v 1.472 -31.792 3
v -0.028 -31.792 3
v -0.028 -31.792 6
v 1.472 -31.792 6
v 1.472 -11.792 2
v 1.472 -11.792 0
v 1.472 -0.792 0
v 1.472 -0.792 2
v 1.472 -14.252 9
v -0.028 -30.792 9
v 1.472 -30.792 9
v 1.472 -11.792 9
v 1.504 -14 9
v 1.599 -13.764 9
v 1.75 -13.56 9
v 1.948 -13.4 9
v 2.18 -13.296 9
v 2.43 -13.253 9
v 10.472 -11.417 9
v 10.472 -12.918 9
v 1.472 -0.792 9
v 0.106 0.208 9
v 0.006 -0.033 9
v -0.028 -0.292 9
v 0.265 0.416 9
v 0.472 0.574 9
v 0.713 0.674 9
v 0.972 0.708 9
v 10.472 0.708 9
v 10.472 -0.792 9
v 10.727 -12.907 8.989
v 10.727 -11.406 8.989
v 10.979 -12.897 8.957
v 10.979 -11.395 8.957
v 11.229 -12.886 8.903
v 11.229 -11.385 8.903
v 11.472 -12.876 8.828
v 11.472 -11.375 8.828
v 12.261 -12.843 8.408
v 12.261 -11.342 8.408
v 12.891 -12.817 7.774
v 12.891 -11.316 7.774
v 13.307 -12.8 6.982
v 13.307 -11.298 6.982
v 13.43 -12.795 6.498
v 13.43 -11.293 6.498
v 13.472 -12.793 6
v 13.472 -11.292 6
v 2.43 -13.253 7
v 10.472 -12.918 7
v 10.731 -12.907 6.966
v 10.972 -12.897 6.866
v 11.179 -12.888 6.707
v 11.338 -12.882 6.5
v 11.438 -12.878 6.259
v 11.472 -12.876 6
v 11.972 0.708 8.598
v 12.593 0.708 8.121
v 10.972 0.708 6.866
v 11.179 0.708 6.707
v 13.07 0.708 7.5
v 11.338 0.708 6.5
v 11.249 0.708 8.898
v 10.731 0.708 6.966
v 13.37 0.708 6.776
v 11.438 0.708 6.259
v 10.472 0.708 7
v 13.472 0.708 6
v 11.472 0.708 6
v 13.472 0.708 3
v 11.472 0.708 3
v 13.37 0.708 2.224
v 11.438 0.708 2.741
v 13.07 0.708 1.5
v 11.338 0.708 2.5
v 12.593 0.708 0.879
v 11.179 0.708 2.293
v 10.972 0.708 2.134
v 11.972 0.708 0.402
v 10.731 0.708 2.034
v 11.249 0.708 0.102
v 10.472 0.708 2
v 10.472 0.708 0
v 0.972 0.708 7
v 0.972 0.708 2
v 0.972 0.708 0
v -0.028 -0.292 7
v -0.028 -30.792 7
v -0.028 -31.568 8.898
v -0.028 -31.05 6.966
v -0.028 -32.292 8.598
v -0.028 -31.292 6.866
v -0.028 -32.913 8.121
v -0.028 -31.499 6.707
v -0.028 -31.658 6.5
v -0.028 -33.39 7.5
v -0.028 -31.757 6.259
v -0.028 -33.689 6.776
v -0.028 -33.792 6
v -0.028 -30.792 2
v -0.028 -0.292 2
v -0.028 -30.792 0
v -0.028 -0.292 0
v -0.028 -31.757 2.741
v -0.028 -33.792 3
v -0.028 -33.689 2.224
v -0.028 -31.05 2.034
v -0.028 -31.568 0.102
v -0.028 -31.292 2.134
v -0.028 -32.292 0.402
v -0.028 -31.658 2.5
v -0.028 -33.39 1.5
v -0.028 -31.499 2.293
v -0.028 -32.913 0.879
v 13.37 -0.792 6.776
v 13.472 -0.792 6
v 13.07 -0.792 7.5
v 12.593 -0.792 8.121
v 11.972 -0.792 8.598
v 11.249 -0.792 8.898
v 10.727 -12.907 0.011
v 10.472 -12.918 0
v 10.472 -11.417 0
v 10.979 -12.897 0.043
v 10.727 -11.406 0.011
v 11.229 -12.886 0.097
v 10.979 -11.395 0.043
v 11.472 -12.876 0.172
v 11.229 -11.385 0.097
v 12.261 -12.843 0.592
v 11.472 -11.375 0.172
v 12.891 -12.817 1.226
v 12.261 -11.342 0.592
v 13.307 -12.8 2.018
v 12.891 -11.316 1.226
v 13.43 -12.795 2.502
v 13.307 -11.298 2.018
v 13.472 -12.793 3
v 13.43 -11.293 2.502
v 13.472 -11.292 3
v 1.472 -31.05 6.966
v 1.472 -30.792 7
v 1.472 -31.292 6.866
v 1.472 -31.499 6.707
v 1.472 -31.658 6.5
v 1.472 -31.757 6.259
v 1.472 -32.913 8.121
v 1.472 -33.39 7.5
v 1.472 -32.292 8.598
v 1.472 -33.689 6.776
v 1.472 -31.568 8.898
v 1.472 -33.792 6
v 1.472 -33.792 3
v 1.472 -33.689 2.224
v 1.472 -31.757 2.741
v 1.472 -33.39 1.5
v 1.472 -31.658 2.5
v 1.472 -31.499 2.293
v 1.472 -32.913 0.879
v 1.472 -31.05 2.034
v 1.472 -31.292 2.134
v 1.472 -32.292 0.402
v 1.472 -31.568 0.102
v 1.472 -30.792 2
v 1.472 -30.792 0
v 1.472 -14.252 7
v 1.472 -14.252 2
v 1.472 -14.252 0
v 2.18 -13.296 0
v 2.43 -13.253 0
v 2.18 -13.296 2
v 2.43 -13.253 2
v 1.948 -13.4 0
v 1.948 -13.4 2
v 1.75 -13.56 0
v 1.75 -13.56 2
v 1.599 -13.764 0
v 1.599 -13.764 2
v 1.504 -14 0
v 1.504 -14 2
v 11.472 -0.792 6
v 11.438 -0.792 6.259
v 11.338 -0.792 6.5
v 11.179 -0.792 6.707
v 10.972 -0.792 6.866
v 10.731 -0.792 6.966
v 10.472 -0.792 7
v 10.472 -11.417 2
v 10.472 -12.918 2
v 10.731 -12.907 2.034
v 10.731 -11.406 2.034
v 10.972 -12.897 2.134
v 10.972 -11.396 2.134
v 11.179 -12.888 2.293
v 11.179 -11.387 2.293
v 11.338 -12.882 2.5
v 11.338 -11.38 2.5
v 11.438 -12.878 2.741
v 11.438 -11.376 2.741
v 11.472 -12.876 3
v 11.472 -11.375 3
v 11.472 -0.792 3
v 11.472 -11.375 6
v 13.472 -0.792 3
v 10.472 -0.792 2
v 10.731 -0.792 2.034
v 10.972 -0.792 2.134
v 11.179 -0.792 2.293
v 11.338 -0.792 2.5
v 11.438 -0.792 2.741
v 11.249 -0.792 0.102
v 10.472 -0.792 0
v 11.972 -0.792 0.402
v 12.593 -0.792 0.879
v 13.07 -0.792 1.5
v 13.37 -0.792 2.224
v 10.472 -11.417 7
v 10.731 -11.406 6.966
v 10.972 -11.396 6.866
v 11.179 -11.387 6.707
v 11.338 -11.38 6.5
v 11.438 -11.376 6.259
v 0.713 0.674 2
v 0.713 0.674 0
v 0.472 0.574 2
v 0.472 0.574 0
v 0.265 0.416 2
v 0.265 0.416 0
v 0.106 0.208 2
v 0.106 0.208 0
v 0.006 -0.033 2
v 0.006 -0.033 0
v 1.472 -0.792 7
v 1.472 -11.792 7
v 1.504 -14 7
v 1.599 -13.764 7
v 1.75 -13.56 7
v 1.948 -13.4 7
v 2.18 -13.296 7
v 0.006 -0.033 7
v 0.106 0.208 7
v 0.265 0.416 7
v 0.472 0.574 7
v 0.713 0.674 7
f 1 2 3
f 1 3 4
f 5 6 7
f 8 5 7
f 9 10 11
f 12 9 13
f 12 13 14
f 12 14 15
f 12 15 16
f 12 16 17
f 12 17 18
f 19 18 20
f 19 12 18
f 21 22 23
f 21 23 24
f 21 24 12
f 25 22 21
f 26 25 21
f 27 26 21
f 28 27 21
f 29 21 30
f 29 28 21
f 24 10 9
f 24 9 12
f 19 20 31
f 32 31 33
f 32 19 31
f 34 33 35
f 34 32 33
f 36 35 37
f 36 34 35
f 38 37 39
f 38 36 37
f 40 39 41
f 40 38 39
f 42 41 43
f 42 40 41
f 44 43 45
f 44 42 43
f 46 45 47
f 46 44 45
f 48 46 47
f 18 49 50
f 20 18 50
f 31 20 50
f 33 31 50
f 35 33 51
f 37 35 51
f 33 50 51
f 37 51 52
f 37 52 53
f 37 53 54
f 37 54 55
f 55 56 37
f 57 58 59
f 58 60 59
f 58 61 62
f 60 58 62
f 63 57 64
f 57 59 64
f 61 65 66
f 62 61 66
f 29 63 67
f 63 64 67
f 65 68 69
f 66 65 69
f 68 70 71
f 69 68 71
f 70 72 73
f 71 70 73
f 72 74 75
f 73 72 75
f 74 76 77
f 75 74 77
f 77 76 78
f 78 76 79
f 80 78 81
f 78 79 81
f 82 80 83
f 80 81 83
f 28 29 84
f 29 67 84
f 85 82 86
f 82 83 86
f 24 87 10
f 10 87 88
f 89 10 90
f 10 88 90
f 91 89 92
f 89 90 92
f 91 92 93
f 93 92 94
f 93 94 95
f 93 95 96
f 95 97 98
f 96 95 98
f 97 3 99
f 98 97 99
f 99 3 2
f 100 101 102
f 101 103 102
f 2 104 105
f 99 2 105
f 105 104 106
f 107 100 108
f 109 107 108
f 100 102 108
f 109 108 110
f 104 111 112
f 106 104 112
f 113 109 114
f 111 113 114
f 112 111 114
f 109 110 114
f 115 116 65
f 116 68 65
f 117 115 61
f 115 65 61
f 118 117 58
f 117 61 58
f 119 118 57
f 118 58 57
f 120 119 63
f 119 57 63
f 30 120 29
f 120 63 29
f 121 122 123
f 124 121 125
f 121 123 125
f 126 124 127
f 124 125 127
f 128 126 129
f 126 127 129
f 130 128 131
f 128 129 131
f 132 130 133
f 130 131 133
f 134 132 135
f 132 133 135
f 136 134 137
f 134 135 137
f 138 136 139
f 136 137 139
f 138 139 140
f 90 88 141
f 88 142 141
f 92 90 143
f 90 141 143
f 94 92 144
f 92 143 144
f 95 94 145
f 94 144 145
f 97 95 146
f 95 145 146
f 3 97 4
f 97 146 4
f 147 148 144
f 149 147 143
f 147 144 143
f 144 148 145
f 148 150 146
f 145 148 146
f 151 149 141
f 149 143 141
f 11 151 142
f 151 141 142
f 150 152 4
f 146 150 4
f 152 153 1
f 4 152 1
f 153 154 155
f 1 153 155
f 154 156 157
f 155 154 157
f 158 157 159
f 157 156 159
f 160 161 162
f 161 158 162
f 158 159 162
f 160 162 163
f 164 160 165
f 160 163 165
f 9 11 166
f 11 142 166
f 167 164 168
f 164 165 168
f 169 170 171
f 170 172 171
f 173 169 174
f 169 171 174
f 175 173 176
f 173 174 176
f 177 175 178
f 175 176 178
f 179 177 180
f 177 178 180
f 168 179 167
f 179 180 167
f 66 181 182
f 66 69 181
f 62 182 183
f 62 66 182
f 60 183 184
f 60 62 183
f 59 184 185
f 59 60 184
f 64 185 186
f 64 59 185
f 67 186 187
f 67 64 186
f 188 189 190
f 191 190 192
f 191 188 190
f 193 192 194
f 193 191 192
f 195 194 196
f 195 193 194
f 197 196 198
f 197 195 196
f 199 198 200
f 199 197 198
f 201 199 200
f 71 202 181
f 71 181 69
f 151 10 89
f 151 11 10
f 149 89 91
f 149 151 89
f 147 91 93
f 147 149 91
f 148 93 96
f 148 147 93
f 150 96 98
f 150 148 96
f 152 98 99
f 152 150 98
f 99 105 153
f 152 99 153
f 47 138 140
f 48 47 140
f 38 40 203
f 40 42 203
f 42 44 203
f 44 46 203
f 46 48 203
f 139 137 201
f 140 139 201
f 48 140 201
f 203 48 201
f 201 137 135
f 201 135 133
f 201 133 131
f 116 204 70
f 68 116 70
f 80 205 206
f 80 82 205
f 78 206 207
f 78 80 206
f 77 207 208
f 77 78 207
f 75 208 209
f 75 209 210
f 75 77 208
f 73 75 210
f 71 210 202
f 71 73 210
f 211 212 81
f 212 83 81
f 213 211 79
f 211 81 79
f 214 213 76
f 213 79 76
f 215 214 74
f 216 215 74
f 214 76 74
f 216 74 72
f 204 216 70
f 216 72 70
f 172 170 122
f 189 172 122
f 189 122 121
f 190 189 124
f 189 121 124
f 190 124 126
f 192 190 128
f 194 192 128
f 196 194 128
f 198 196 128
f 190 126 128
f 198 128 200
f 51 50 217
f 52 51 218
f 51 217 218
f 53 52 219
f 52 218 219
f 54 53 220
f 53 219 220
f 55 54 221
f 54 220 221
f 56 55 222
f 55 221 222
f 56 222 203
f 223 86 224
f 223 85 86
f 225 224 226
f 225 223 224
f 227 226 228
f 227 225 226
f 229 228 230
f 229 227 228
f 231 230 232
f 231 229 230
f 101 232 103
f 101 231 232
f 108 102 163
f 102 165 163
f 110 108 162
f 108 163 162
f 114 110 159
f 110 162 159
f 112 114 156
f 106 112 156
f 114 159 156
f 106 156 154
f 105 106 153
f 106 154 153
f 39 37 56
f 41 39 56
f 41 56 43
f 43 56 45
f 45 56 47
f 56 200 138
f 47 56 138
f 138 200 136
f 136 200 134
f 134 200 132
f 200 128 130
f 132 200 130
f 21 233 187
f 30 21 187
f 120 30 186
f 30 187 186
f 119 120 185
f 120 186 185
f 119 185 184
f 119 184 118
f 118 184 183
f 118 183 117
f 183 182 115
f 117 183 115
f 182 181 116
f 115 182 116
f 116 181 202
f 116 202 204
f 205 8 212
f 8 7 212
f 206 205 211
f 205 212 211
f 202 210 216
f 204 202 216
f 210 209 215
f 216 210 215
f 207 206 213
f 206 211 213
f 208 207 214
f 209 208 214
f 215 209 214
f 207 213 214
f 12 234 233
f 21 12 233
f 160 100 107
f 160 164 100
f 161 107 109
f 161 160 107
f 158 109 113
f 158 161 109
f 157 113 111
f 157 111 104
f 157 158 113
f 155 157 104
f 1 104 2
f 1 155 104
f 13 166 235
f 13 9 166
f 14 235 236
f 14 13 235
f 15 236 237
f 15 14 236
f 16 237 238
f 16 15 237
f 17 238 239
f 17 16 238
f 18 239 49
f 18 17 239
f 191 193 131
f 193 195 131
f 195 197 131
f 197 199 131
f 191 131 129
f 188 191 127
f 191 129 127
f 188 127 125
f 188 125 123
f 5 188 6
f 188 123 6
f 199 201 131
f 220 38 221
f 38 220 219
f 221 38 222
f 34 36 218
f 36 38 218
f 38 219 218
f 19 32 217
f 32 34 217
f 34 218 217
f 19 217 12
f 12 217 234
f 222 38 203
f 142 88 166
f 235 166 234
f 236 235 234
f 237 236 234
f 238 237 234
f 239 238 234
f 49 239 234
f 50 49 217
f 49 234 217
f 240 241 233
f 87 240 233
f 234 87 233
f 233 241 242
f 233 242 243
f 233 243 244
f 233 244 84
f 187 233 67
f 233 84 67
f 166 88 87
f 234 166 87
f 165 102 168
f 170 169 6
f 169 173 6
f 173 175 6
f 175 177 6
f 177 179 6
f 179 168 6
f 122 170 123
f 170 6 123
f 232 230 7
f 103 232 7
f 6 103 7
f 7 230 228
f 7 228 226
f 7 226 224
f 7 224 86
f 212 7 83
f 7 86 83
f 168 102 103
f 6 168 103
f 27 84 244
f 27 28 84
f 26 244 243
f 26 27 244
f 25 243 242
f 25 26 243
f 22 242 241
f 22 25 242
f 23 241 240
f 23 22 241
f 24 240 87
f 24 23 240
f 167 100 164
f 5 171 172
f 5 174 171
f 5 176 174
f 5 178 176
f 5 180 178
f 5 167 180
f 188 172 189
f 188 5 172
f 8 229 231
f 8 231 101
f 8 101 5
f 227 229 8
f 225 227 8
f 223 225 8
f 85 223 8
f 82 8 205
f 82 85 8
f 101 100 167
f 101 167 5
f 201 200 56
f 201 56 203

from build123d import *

# Parameters (mm, degrees)
F1_DEPTH      = 2.5
F1_DEPTH_BACK = 2.5
F2_SIZE2      = 1
F2_SIZE       = 2
F3_R          = 3
F4_START      = 4
F4_DEPTH      = 5
F5_R          = 5
F5_2_R        = 5
F6_R          = 2
F6_2_R        = 2
F7_W          = 2.5
F7_H          = 2.5
F8_ANGLE      = 90
F9_DEPTH      = 10
F11_DEPTH     = 8
F12_DEPTH     = 8
F15_START     = 2.5
F14_R         = 2.5
F15_DEPTH     = 1.5
F16_W         = 12
F16_H         = 2
F16_W_2       = 2
F16_H_2       = 20
F17_DEPTH     = 7
F18_T         = -1
F16_H_3       = 1.5
F16_W_3       = 1.5
F19_DEPTH     = 9
F20_START     = 2
F20_DEPTH     = 5
F21_R         = 3
F21_2_R       = 3
F22_T1_DEPTH  = 2
F22_T3_DEPTH  = 1
F22_T5_DEPTH  = 1
F22_T7_DEPTH  = 2
F22_T9_DEPTH  = 2
F22_T11_DEPTH = 11
F22_T13_DEPTH = 32
F22_S17_W     = 1.02
F22_S17_H     = 1.02
F22_T18_DEPTH = 1.02
F22_S23_W     = 1.02
F22_S23_H     = 1.02
F22_T24_DEPTH = 1.02
F22_T28_ANGLE = 233.2969892374
F22_T30_ANGLE = 233.2969892374
F22_T32_ANGLE = 233.2969892374
F22_T34_ANGLE = 233.2969892374
F22_T35_DEPTH = 9
F22_T37_DEPTH = 9
F22_T39_DEPTH = 17
F22_T42_ANGLE = 233.2969892374
F22_T44_ANGLE = 90
F22_T46_ANGLE = 233.2969892374
F22_T48_ANGLE = 90
F22_T50_ANGLE = 90
F22_T52_ANGLE = 233.2969892374
F22_T54_ANGLE = 233.2969892374
F22_T56_ANGLE = 90
F22_T58_ANGLE = 233.2969892374
F22_T60_ANGLE = 233.2969892374
F22_T62_ANGLE = 90
F22_T64_ANGLE = 233.2969892374
F22_T66_ANGLE = 90
F22_T68_ANGLE = 233.2969892374
F22_2_F1_R    = 1
F22_2_F2_R    = 1


# Not quite as in the source:
# - a fillet or chamfer that OpenCascade refuses, or shapes differently, is made with other operations: its cross-section is extruded or revolved along the edge and cut away or added
# - a feature names something its author has since deleted; it is built from what else it names


with BuildPart() as f1:
    # F0 (on Top) → F1 (new body, two sides)
    with BuildSketch(Plane.XY) as f1_sk:
        Polygon((-2.4175545031, 19.9997189244), (-63.6058346017, 10), (-71.3429901912, 55.5274909482), (-73.2526121256, 67.2124675644), (-87.2356820635, 67.2124675644), (-132.104240014, 0), (-120.0807613656, 0), (-81.7352983314, 57.4409632971), (-81.1490054203, 53.9442313206), (-72.104240014, 0), (-63.6058346017, 0), (-0.7575159774, 9.8419431859), (0.8509074882, 0), (10.9835668635, 0), (4.4465969461, 39.9997189244), (-5.6860624292, 39.9997189244), align=None)
    extrude(amount=F1_DEPTH)
    extrude(f1_sk.sketch, amount=-F1_DEPTH_BACK)

    # F2
    f2_edges = [f1.edges().sort_by_distance(p)[0] for p in [
        (-80.244147, 67.212468, 2.5),
    ]]
    f2_side = f1.faces().sort_by_distance((-80.244147, 67.212468, 0))[0]
    chamfer(f2_edges, length=F2_SIZE, length2=F2_SIZE2, reference=f2_side)

    # F3
    f3_edges = [f1.edges().sort_by_distance(p)[0] for p in [
        (-80.496216, 66.212468, 2.5),
    ]]
    fillet(f3_edges, radius=F3_R)

    # F5
    f5_edges = [f1.edges().sort_by_distance(p)[0] for p in [
        (-81.735298, 57.440963, 0),
        (-72.10424, 0, 0),
        (-120.080761, 0, 0),
        (0.850907, 0, 0),
        (-87.235682, 67.212468, -1),
        (-73.252612, 67.212468, -1),
        (4.446597, 39.999719, 0),
    ]]
    fillet(f5_edges, radius=F5_R)

    # F6
    f6_edges = [f1.edges().sort_by_distance(p)[0] for p in [
        (-2.417555, 19.999719, 0),
        (-63.605835, 10, 0),
        (-0.757516, 9.841943, 0),
        (-5.686062, 39.999719, 0),
        (10.983567, 0, 0),
        (-132.10424, 0, 0),
    ]]
    fillet(f6_edges, radius=F6_R)

    # F7 (on Top) → F8 (revolve, cut)
    with BuildSketch(Plane.XY):
        Polygon((-82.9107738397, 68.988720722), (-82.9107738397, 65.988720722), (-82.0857738397, 65.988720722), (-79.9107738397, 65.988720722), (-77.7357738397, 65.988720722), (-76.9107738397, 65.988720722), (-76.9107738397, 68.988720722), align=None)
        Polygon((-82.4107738397, 65.488720722), (-79.9107738397, 65.488720722), (-77.4107738397, 65.488720722), (-76.9107738397, 65.1856904189), (-76.9107738397, 65.488720722), (-77.7357738397, 65.988720722), (-79.9107738397, 65.988720722), (-82.0857738397, 65.988720722), (-82.9107738397, 65.488720722), (-82.9107738397, 65.1856904189), align=None)
        Polygon((-82.9107738397, 65.988720722), (-82.9107738397, 65.488720722), (-82.0857738397, 65.988720722), align=None)
        Polygon((-77.7357738397, 65.988720722), (-76.9107738397, 65.488720722), (-76.9107738397, 65.988720722), align=None)
        Polygon((-82.9107738397, 65.1856904189), (-82.9107738397, 62.988720722), (-82.4107738397, 62.988720722), (-82.4107738397, 65.488720722), align=None)
        with Locations((-81.1607738397, 64.238720722)):
            Rectangle(F7_W, F7_H)
        with Locations((-78.6607738397, 64.238720722)):
            Rectangle(F7_W, F7_H)
        Polygon((-77.4107738397, 62.988720722), (-76.9107738397, 62.988720722), (-76.9107738397, 65.1856904189), (-77.4107738397, 65.488720722), align=None)
    revolve(axis=Axis((-79.9107738397, 62.988720722, 0), (-1, 0, 0)), revolution_arc=F8_ANGLE, mode=Mode.SUBTRACT)


with BuildPart() as f4:
    # F0 (on Top) → F4 (new body)
    with BuildSketch(Plane.XY.offset(F4_START)):
        Polygon((-2.4175545031, 19.9997189244), (-63.6058346017, 10), (-71.3429901912, 55.5274909482), (-73.2526121256, 67.2124675644), (-87.2356820635, 67.2124675644), (-132.104240014, 0), (-120.0807613656, 0), (-81.7352983314, 57.4409632971), (-81.1490054203, 53.9442313206), (-72.104240014, 0), (-63.6058346017, 0), (-0.7575159774, 9.8419431859), (0.8509074882, 0), (10.9835668635, 0), (4.4465969461, 39.9997189244), (-5.6860624292, 39.9997189244), align=None)
    extrude(amount=F4_DEPTH)

    # F5#2
    f5_2_edges = [f4.edges().sort_by_distance(p)[0] for p in [
        (-81.735298, 57.440963, 6.5),
        (-72.10424, 0, 6.5),
        (-120.080761, 0, 6.5),
        (0.850907, 0, 6.5),
        (-87.235682, 67.212468, 6.5),
        (-73.252612, 67.212468, 6.5),
        (4.446597, 39.999719, 6.5),
    ]]
    fillet(f5_2_edges, radius=F5_2_R)

    # F6#2
    f6_2_edges = [f4.edges().sort_by_distance(p)[0] for p in [
        (-2.417555, 19.999719, 6.5),
        (-63.605835, 10, 6.5),
        (-0.757516, 9.841943, 6.5),
        (-5.686062, 39.999719, 6.5),
        (10.983567, 0, 6.5),
        (-132.10424, 0, 6.5),
    ]]
    fillet(f6_2_edges, radius=F6_2_R)


with BuildPart() as f9_tool:
    # F7 (on Top) → F9 (new body)
    with BuildSketch(Plane.XY):
        Polygon((-82.9107738397, 68.988720722), (-82.9107738397, 65.988720722), (-82.0857738397, 65.988720722), (-79.9107738397, 65.988720722), (-77.7357738397, 65.988720722), (-76.9107738397, 65.988720722), (-76.9107738397, 68.988720722), align=None)
        Polygon((-82.9107738397, 65.988720722), (-82.9107738397, 65.488720722), (-82.0857738397, 65.988720722), align=None)
        Polygon((-77.7357738397, 65.988720722), (-76.9107738397, 65.488720722), (-76.9107738397, 65.988720722), align=None)
        Polygon((-82.4107738397, 65.488720722), (-79.9107738397, 65.488720722), (-77.4107738397, 65.488720722), (-76.9107738397, 65.1856904189), (-76.9107738397, 65.488720722), (-77.7357738397, 65.988720722), (-79.9107738397, 65.988720722), (-82.0857738397, 65.988720722), (-82.9107738397, 65.488720722), (-82.9107738397, 65.1856904189), align=None)
        Polygon((-82.9107738397, 65.1856904189), (-82.9107738397, 62.988720722), (-82.4107738397, 62.988720722), (-82.4107738397, 65.488720722), align=None)
        with Locations((-81.1607738397, 64.238720722)):
            Rectangle(F7_W, F7_H)
        with Locations((-78.6607738397, 64.238720722)):
            Rectangle(F7_W, F7_H)
        Polygon((-77.4107738397, 62.988720722), (-76.9107738397, 62.988720722), (-76.9107738397, 65.1856904189), (-77.4107738397, 65.488720722), align=None)
        Polygon((-82.9107738397, 59.988720722), (-79.9107738397, 59.988720722), (-79.9107738397, 60.488720722), (-82.4107738397, 60.488720722), (-82.4107738397, 62.988720722), (-82.9107738397, 62.988720722), align=None)
        with Locations((-81.1607738397, 61.738720722)):
            Rectangle(F7_W, F7_H)
        with Locations((-78.6607738397, 61.738720722)):
            Rectangle(F7_W, F7_H)
        Polygon((-79.9107738397, 60.488720722), (-79.9107738397, 59.988720722), (-76.9107738397, 59.988720722), (-76.9107738397, 62.988720722), (-77.4107738397, 62.988720722), (-77.4107738397, 60.488720722), align=None)
    extrude(amount=F9_DEPTH)


with BuildPart() as f1_1:
    add(f1.part)

    # F9: cut by f9_tool
    add(f9_tool.part, mode=Mode.SUBTRACT)

    # F7 (on Top) → F10 (revolve, cut)
    with BuildSketch(Plane.XY):
        Polygon((-85.7107738397, 63.488720722), (-82.9107738397, 65.1856904189), (-82.9107738397, 65.488720722), (-86.2107738397, 63.488720722), (-86.2107738397, 62.988720722), (-85.7107738397, 62.988720722), align=None)
        Polygon((-85.7107738397, 62.988720722), (-82.9107738397, 62.988720722), (-82.9107738397, 65.1856904189), (-85.7107738397, 63.488720722), align=None)
        Polygon((-82.4107738397, 65.488720722), (-79.9107738397, 65.488720722), (-77.4107738397, 65.488720722), (-76.9107738397, 65.1856904189), (-76.9107738397, 65.488720722), (-77.7357738397, 65.988720722), (-79.9107738397, 65.988720722), (-82.0857738397, 65.988720722), (-82.9107738397, 65.488720722), (-82.9107738397, 65.1856904189), align=None)
        Polygon((-82.9107738397, 65.1856904189), (-82.9107738397, 62.988720722), (-82.4107738397, 62.988720722), (-82.4107738397, 65.488720722), align=None)
        with Locations((-81.1607738397, 64.238720722)):
            Rectangle(F7_W, F7_H)
        with Locations((-78.6607738397, 64.238720722)):
            Rectangle(F7_W, F7_H)
        Polygon((-77.4107738397, 62.988720722), (-76.9107738397, 62.988720722), (-76.9107738397, 65.1856904189), (-77.4107738397, 65.488720722), align=None)
        Polygon((-76.9107738397, 65.1856904189), (-76.9107738397, 62.988720722), (-74.1107738397, 62.988720722), (-74.1107738397, 63.488720722), align=None)
        Polygon((-76.9107738397, 65.488720722), (-76.9107738397, 65.1856904189), (-74.1107738397, 63.488720722), (-74.1107738397, 62.988720722), (-73.6107738397, 62.988720722), (-73.6107738397, 63.488720722), align=None)
    revolve(axis=Axis((-75.7607738397, 62.988720722, 0), (1, 0, 0)), mode=Mode.SUBTRACT)

    # F7 (on Top) → F11 (cut)
    with BuildSketch(Plane.XY):
        with Locations((-78.6607738397, 64.238720722)):
            Rectangle(F7_W, F7_H)
        with Locations((-81.1607738397, 64.238720722)):
            Rectangle(F7_W, F7_H)
        with Locations((-78.6607738397, 61.738720722)):
            Rectangle(F7_W, F7_H)
        with Locations((-81.1607738397, 61.738720722)):
            Rectangle(F7_W, F7_H)
    extrude(amount=F11_DEPTH, mode=Mode.SUBTRACT)



with BuildPart() as f4_1:
    add(f4.part)

    # F9: cut by f9_tool
    add(f9_tool.part, mode=Mode.SUBTRACT)


with BuildPart() as f12:
    # F7 (on Top) → F12 (new body)
    with BuildSketch(Plane.XY):
        with Locations((-81.1607738397, 64.238720722)):
            Rectangle(F7_W, F7_H)
        with Locations((-78.6607738397, 64.238720722)):
            Rectangle(F7_W, F7_H)
        with Locations((-81.1607738397, 61.738720722)):
            Rectangle(F7_W, F7_H)
        with Locations((-78.6607738397, 61.738720722)):
            Rectangle(F7_W, F7_H)
    extrude(amount=F12_DEPTH)

    # F7 (on Top) → F13 (revolve)
    with BuildSketch(Plane.XY):
        Polygon((-85.7107738397, 62.988720722), (-82.9107738397, 62.988720722), (-82.9107738397, 65.1856904189), (-85.7107738397, 63.488720722), align=None)
        Polygon((-82.9107738397, 65.1856904189), (-82.9107738397, 62.988720722), (-82.4107738397, 62.988720722), (-82.4107738397, 65.488720722), align=None)
        with Locations((-81.1607738397, 64.238720722)):
            Rectangle(F7_W, F7_H)
        with Locations((-78.6607738397, 64.238720722)):
            Rectangle(F7_W, F7_H)
        Polygon((-77.4107738397, 62.988720722), (-76.9107738397, 62.988720722), (-76.9107738397, 65.1856904189), (-77.4107738397, 65.488720722), align=None)
        Polygon((-76.9107738397, 65.1856904189), (-76.9107738397, 62.988720722), (-74.1107738397, 62.988720722), (-74.1107738397, 63.488720722), align=None)
    revolve(axis=Axis((-79.9107738397, 62.988720722, 0), (1, 0, 0)))


with BuildPart() as f1_2:
    add(f1_1.part)

    add(f4_1.part)  # F15 merges F4
    # F14 (on Top) → F15 (join)
    with BuildSketch(Plane.XY.offset(F15_START)):
        with Locations((5.1001101943, 5)):
            Circle(F14_R)
        with Locations((0.6434008568, 34.9997189244)):
            Circle(F14_R)
        with Locations((-122.7546855807, 5)):
            Circle(F14_R)
        with Locations((-67.8727891486, 5)):
            Circle(F14_R)
        with Locations((-81.4505400433, 54.6900098794)):
            Circle(F14_R)
    extrude(amount=F15_DEPTH)


with BuildPart() as f17:
    # F16 (on Top) → F17 (new body)
    with BuildSketch(Plane.XY):
        Polygon((-30.1369051993, -11.2915403917), (-30.1369051993, -0.2915403917), (-18.1369051993, -0.2915403917), (-18.1369051993, 1.7084596083), (-32.1369051993, 1.7084596083), (-32.1369051993, -13.2915403917), (-30.1369051993, -13.2915403917), align=None)
        with Locations((-24.1369051993, -12.2915403917)):
            Rectangle(F16_W, F16_H)
        with Locations((-31.1369051993, -23.2915403917)):
            Rectangle(F16_W_2, F16_H_2)
    extrude(amount=F17_DEPTH)

    # F18
    f18_openings = [f17.faces().sort_by_distance(p)[0] for p in [
        (-30.136905, -23.29154, 3.5),
        (-30.136905, -5.79154, 3.5),
        (-24.136905, -13.29154, 3.5),
        (-24.136905, -0.29154, 3.5),
        (-24.136905, -11.29154, 3.5),
        (-25.136905, 1.70846, 3.5),
        (-32.136905, -15.79154, 3.5),
    ]]
    offset(amount=F18_T, openings=f18_openings)

    # F21
    f21_edges = [f17.edges().sort_by_distance(p)[0] for p in [
        (-31.136905, -33.29154, 7),
        (-31.136905, -33.29154, 0),
        (-18.136905, -12.29154, 0),
        (-18.136905, -12.29154, 7),
        (-18.136905, 0.70846, 7),
        (-18.136905, 0.70846, 0),
    ]]
    fillet(f21_edges, radius=F21_R)

    # F22: fillet of radius 1 on 28 edges, made by hand

    # F22_s2 → F22_t1 (join)
    with BuildSketch(Plane.YZ.offset(-32.1369051993)):
        with BuildLine():
            ThreePointArc((-31.2915403917, 1), (-31.9986471729, 1.2928932188), (-32.2915403917, 2))
            Line((-32.2915403917, 2), (-32.3115403917, 2))
            Line((-32.3115403917, 2), (-32.3115403917, 0.98))
            Line((-32.3115403917, 0.98), (-31.2915403917, 0.98))
            Line((-31.2915403917, 0.98), (-31.2915403917, 1))
        make_face()
        with BuildLine():
            ThreePointArc((-31.2915403917, 6), (-31.9986471729, 5.7071067812), (-32.2915403917, 5))
            Line((-32.2915403917, 5), (-32.3115403917, 5))
            Line((-32.3115403917, 5), (-32.3115403917, 6.02))
            Line((-32.3115403917, 6.02), (-31.2915403917, 6.02))
            Line((-31.2915403917, 6.02), (-31.2915403917, 6))
        make_face()
    extrude(amount=F22_T1_DEPTH)

    # F22_s4 → F22_t3 (join)
    with BuildSketch(Plane.XY):
        with BuildLine():
            ThreePointArc((-29.1369051993, -0.2915403917), (-29.8440119805, -0.5844336106), (-30.1369051993, -1.2915403917))
            Line((-30.1369051993, -1.2915403917), (-30.1569051993, -1.2915403917))
            Line((-30.1569051993, -1.2915403917), (-30.1569051993, -0.2715403917))
            Line((-30.1569051993, -0.2715403917), (-29.1369051993, -0.2715403917))
            Line((-29.1369051993, -0.2715403917), (-29.1369051993, -0.2915403917))
        make_face()
        with BuildLine():
            ThreePointArc((-29.1369051993, -13.2915403917), (-29.8440119805, -13.5844336106), (-30.1369051993, -14.2915403917))
            Line((-30.1369051993, -14.2915403917), (-30.1569051993, -14.2915403917))
            Line((-30.1569051993, -14.2915403917), (-30.1569051993, -13.2715403917))
            Line((-30.1569051993, -13.2715403917), (-29.1369051993, -13.2715403917))
            Line((-29.1369051993, -13.2715403917), (-29.1369051993, -13.2915403917))
        make_face()
        with BuildLine():
            ThreePointArc((-30.1369051993, -10.2915403917), (-29.8440119805, -10.9986471729), (-29.1369051993, -11.2915403917))
            Line((-29.1369051993, -11.2915403917), (-29.1369051993, -11.3115403917))
            Line((-29.1369051993, -11.3115403917), (-30.1569051993, -11.3115403917))
            Line((-30.1569051993, -11.3115403917), (-30.1569051993, -10.2915403917))
            Line((-30.1569051993, -10.2915403917), (-30.1369051993, -10.2915403917))
        make_face()
    extrude(amount=F22_T3_DEPTH)

    # F22_s6 → F22_t5 (join)
    with BuildSketch(Plane.XY.offset(6)):
        with BuildLine():
            ThreePointArc((-29.1369051993, -0.2915403917), (-29.8440119805, -0.5844336106), (-30.1369051993, -1.2915403917))
            Line((-30.1369051993, -1.2915403917), (-30.1569051993, -1.2915403917))
            Line((-30.1569051993, -1.2915403917), (-30.1569051993, -0.2715403917))
            Line((-30.1569051993, -0.2715403917), (-29.1369051993, -0.2715403917))
            Line((-29.1369051993, -0.2715403917), (-29.1369051993, -0.2915403917))
        make_face()
        with BuildLine():
            ThreePointArc((-29.1369051993, -13.2915403917), (-29.8440119805, -13.5844336106), (-30.1369051993, -14.2915403917))
            Line((-30.1369051993, -14.2915403917), (-30.1569051993, -14.2915403917))
            Line((-30.1569051993, -14.2915403917), (-30.1569051993, -13.2715403917))
            Line((-30.1569051993, -13.2715403917), (-29.1369051993, -13.2715403917))
            Line((-29.1369051993, -13.2715403917), (-29.1369051993, -13.2915403917))
        make_face()
        with BuildLine():
            ThreePointArc((-30.1369051993, -10.2915403917), (-29.8440119805, -10.9986471729), (-29.1369051993, -11.2915403917))
            Line((-29.1369051993, -11.2915403917), (-29.1369051993, -11.3115403917))
            Line((-29.1369051993, -11.3115403917), (-30.1569051993, -11.3115403917))
            Line((-30.1569051993, -11.3115403917), (-30.1569051993, -10.2915403917))
            Line((-30.1569051993, -10.2915403917), (-30.1369051993, -10.2915403917))
        make_face()
    extrude(amount=F22_T5_DEPTH)

    # F22_s8 → F22_t7 (join)
    with BuildSketch(Plane.XZ.offset(-1.7084596083)):
        with BuildLine():
            ThreePointArc((-20.1369051993, 1), (-19.4297984181, 1.2928932188), (-19.1369051993, 2))
            Line((-19.1369051993, 2), (-19.1169051993, 2))
            Line((-19.1169051993, 2), (-19.1169051993, 0.98))
            Line((-19.1169051993, 0.98), (-20.1369051993, 0.98))
            Line((-20.1369051993, 0.98), (-20.1369051993, 1))
        make_face()
        with BuildLine():
            ThreePointArc((-20.1369051993, 6), (-19.4297984181, 5.7071067812), (-19.1369051993, 5))
            Line((-19.1369051993, 5), (-19.1169051993, 5))
            Line((-19.1169051993, 5), (-19.1169051993, 6.02))
            Line((-19.1169051993, 6.02), (-20.1369051993, 6.02))
            Line((-20.1369051993, 6.02), (-20.1369051993, 6))
        make_face()
    extrude(amount=F22_T7_DEPTH)

    # F22_s10 → F22_t9 (join)
    with BuildSketch(Plane.XZ.offset(11.2915403917)):
        with BuildLine():
            ThreePointArc((-20.1369051993, 1), (-19.4297984181, 1.2928932188), (-19.1369051993, 2))
            Line((-19.1369051993, 2), (-19.1169051993, 2))
            Line((-19.1169051993, 2), (-19.1169051993, 0.98))
            Line((-19.1169051993, 0.98), (-20.1369051993, 0.98))
            Line((-20.1369051993, 0.98), (-20.1369051993, 1))
        make_face()
        with BuildLine():
            ThreePointArc((-20.1369051993, 6), (-19.4297984181, 5.7071067812), (-19.1369051993, 5))
            Line((-19.1369051993, 5), (-19.1169051993, 5))
            Line((-19.1169051993, 5), (-19.1169051993, 6.02))
            Line((-19.1169051993, 6.02), (-20.1369051993, 6.02))
            Line((-20.1369051993, 6.02), (-20.1369051993, 6))
        make_face()
    extrude(amount=F22_T9_DEPTH)

    # F22_s12 → F22_t11 (cut)
    with BuildSketch(Plane.YZ.offset(-31.1369051993)):
        with BuildLine():
            ThreePointArc((1.7084596083, 0), (1.4155663894, 0.7071067812), (0.7084596083, 1))
            Line((0.7084596083, 1), (0.7084596083, 1.02))
            Line((0.7084596083, 1.02), (1.7284596083, 1.02))
            Line((1.7284596083, 1.02), (1.7284596083, 0))
            Line((1.7284596083, 0), (1.7084596083, 0))
        make_face()
        with BuildLine():
            ThreePointArc((1.7084596083, 7), (1.4155663894, 6.2928932188), (0.7084596083, 6))
            Line((0.7084596083, 6), (0.7084596083, 5.98))
            Line((0.7084596083, 5.98), (1.7284596083, 5.98))
            Line((1.7284596083, 5.98), (1.7284596083, 7))
            Line((1.7284596083, 7), (1.7084596083, 7))
        make_face()
    extrude(amount=F22_T11_DEPTH, mode=Mode.SUBTRACT)

    # F22_s14 → F22_t13 (cut)
    with BuildSketch(Plane.XZ.offset(-0.7084596083)):
        with BuildLine():
            ThreePointArc((-31.1369051993, 1), (-31.8440119805, 0.7071067812), (-32.1369051993, 0))
            Line((-32.1369051993, 0), (-32.1569051993, 0))
            Line((-32.1569051993, 0), (-32.1569051993, 1.02))
            Line((-32.1569051993, 1.02), (-31.1369051993, 1.02))
            Line((-31.1369051993, 1.02), (-31.1369051993, 1))
        make_face()
        with BuildLine():
            ThreePointArc((-31.1369051993, 6), (-31.8440119805, 6.2928932188), (-32.1369051993, 7))
            Line((-32.1369051993, 7), (-32.1569051993, 7))
            Line((-32.1569051993, 7), (-32.1569051993, 5.98))
            Line((-32.1569051993, 5.98), (-31.1369051993, 5.98))
            Line((-31.1369051993, 5.98), (-31.1369051993, 6))
        make_face()
    extrude(amount=F22_T13_DEPTH, mode=Mode.SUBTRACT)


with BuildPart() as f19:
    # F16 (on Top) → F19 (new body)
    with BuildSketch(Plane.XY):
        Polygon((1.4721279692, -11.7915420532), (1.4721279692, -0.7915420532), (11.4721279692, -0.7915420532), (11.4721279692, 0.7084579468), (-0.0278720308, 0.7084579468), (-0.0278720308, -31.7915420532), (1.4721279692, -31.7915420532), (1.4721279692, -13.2928435719), align=None)
        with Locations((12.4721279692, -0.0415420532)):
            Rectangle(F16_W_2, F16_H_3)
        with Locations((0.7221279692, -32.7915420532)):
            Rectangle(F16_W_3, F16_H)
        Polygon((11.4721279692, -11.3748753866), (1.4721279692, -11.7915420532), (1.4721279692, -13.2928435719), (11.4721279692, -12.8761769052), align=None)
        Polygon((13.4721279692, -11.2915420532), (11.4721279692, -11.3748753866), (11.4721279692, -12.8761769052), (13.4721279692, -12.7928435719), (13.4721279692, -11.7915420532), align=None)
    extrude(amount=F19_DEPTH)


with BuildPart() as f20_tool:
    # F16 (on Top) → F20 (new body)
    with BuildSketch(Plane.XY.offset(F20_START)):
        Polygon((1.4721279692, -11.7915420532), (1.4721279692, -0.7915420532), (11.4721279692, -0.7915420532), (11.4721279692, 0.7084579468), (-0.0278720308, 0.7084579468), (-0.0278720308, -31.7915420532), (1.4721279692, -31.7915420532), (1.4721279692, -13.2928435719), align=None)
        Polygon((11.4721279692, -11.3748753866), (1.4721279692, -11.7915420532), (1.4721279692, -13.2928435719), (11.4721279692, -12.8761769052), align=None)
    extrude(amount=F20_DEPTH)


with BuildPart() as f1_3:
    add(f1_2.part)

    # F20: cut by f20_tool
    add(f20_tool.part, mode=Mode.SUBTRACT)


with BuildPart() as f19_1:
    add(f19.part)

    # F20: cut by f20_tool
    add(f20_tool.part, mode=Mode.SUBTRACT)

    # F21#2
    f21_2_edges = [f19_1.edges().sort_by_distance(p)[0] for p in [
        (0.722128, -33.791542, 9),
        (0.722128, -33.791542, 0),
        (13.472128, -12.042193, 9),
        (13.472128, -0.041542, 9),
        (13.472128, -0.041542, 0),
        (13.472128, -12.042193, 0),
    ]]
    fillet(f21_2_edges, radius=F21_2_R)

    # F22#2: fillet of radius 1 on 10 edges, made by hand

    # F22_2_f1
    f22_2_f1_edges = [f19_1.edges().sort_by_distance(p)[0] for p in [
        (0.7221279692, -31.7915420532, 2),
        (0.7221279692, -31.7915420532, 7),
        (11.4721279692, -0.0415420532, 2),
        (11.4721279692, -0.0415420532, 7),
        (11.4721279692, -12.1255261459, 2),
        (11.4721279692, -12.1255261459, 7),
        (1.4721279692, -13.2928435719, 1),
        (1.4721279692, -13.2928435719, 8),
    ]]
    fillet(f22_2_f1_edges, radius=F22_2_F1_R)

    # F22_2_f2
    f22_2_f2_edges = [f19_1.edges().sort_by_distance(p)[0] for p in [
        (-0.0278720308, 0.7084579468, 1),
        (-0.0278720308, 0.7084579468, 8),
    ]]
    fillet(f22_2_f2_edges, radius=F22_2_F2_R)


with BuildPart() as f22_tool16:
    # F22_s17 → F22_t18 (new body)
    with BuildSketch(Plane.XY):
        with Locations((-31.6469051993, 1.2184596083)):
            Rectangle(F22_S17_W, F22_S17_H)
    extrude(amount=F22_T18_DEPTH)

    # F22_s19 → F22_t20 (revolve, cut)
    with BuildSketch(Plane(origin=(-31.1369051993, 0.7084596083, 0), x_dir=(0.7071067812, -0.7071067812, 0), z_dir=(-0.7071067812, -0.7071067812, 0))):
        with BuildLine():
            ThreePointArc((0, -1), (1, 0), (0, 1))
            Line((0, 1), (0, -1))
        make_face()
    revolve(axis=Axis((-31.1369051993, 0.7084596083, 0), (0, 0, 1)), mode=Mode.SUBTRACT)


with BuildPart() as f17_1:
    add(f17.part)

    # F22_t15: cut F22_tool16
    add(f22_tool16.part, mode=Mode.SUBTRACT)


with BuildPart() as f22_tool22:
    # F22_s23 → F22_t24 (new body)
    with BuildSketch(Plane.XZ.offset(-0.7084596083)):
        with Locations((-31.6469051993, 6.49)):
            Rectangle(F22_S23_W, F22_S23_H)
    extrude(amount=-F22_T24_DEPTH)

    # F22_s25 → F22_t26 (revolve, cut)
    with BuildSketch(Plane(origin=(-31.1369051993, 0.7084596083, 7), x_dir=(0.7071067812, 0, 0.7071067812), z_dir=(-0.7071067812, 0, 0.7071067812))):
        with BuildLine():
            ThreePointArc((0, -1), (1, 0), (0, 1))
            Line((0, 1), (0, -1))
        make_face()
    revolve(axis=Axis((-31.1369051993, 0.7084596083, 7), (0, 1, 0)), mode=Mode.SUBTRACT)


with BuildPart() as f17_2:
    add(f17_1.part)

    # F22_t21: cut F22_tool22
    add(f22_tool22.part, mode=Mode.SUBTRACT)

    # F22_s27 → F22_t28 (revolve, cut)
    with BuildSketch(Plane.XZ.offset(31.2915403917)):
        with BuildLine():
            ThreePointArc((-32.1369051993, 7), (-31.8440119805, 6.2928932188), (-31.1369051993, 6))
            Line((-31.1369051993, 6), (-31.1369051993, 5.98))
            Line((-31.1369051993, 5.98), (-32.1569051993, 5.98))
            Line((-32.1569051993, 5.98), (-32.1569051993, 7))
            Line((-32.1569051993, 7), (-32.1369051993, 7))
        make_face()
    revolve(axis=Axis((-32.1369051993, -31.2915403917, 5), (1, 0, 0)), revolution_arc=F22_T28_ANGLE, mode=Mode.SUBTRACT)

    # F22_s29 → F22_t30 (revolve, cut)
    with BuildSketch(Plane.YZ.offset(-20.1369051993)):
        with BuildLine():
            ThreePointArc((1.7084596083, 7), (1.4155663894, 6.2928932188), (0.7084596083, 6))
            Line((0.7084596083, 6), (0.7084596083, 5.98))
            Line((0.7084596083, 5.98), (1.7284596083, 5.98))
            Line((1.7284596083, 5.98), (1.7284596083, 7))
            Line((1.7284596083, 7), (1.7084596083, 7))
        make_face()
    revolve(axis=Axis((-20.1369051993, 1.7084596083, 5), (0, 1, 0)), revolution_arc=F22_T30_ANGLE, mode=Mode.SUBTRACT)

    # F22_s31 → F22_t32 (revolve, cut)
    with BuildSketch(Plane.XZ.offset(31.2915403917)):
        with BuildLine():
            ThreePointArc((-32.1369051993, 0), (-31.8440119805, 0.7071067812), (-31.1369051993, 1))
            Line((-31.1369051993, 1), (-31.1369051993, 1.02))
            Line((-31.1369051993, 1.02), (-32.1569051993, 1.02))
            Line((-32.1569051993, 1.02), (-32.1569051993, 0))
            Line((-32.1569051993, 0), (-32.1369051993, 0))
        make_face()
    revolve(axis=Axis((-32.1369051993, -31.2915403917, 2), (-1, 0, 0)), revolution_arc=F22_T32_ANGLE, mode=Mode.SUBTRACT)

    # F22_s33 → F22_t34 (revolve, cut)
    with BuildSketch(Plane.YZ.offset(-20.1369051993)):
        with BuildLine():
            ThreePointArc((1.7084596083, 0), (1.4155663894, 0.7071067812), (0.7084596083, 1))
            Line((0.7084596083, 1), (0.7084596083, 1.02))
            Line((0.7084596083, 1.02), (1.7284596083, 1.02))
            Line((1.7284596083, 1.02), (1.7284596083, 0))
            Line((1.7284596083, 0), (1.7084596083, 0))
        make_face()
    revolve(axis=Axis((-20.1369051993, 1.7084596083, 2), (0, -1, 0)), revolution_arc=F22_T34_ANGLE, mode=Mode.SUBTRACT)

    # F22_s36 → F22_t35 (cut)
    with BuildSketch(Plane.XZ.offset(1.2915403917)):
        with BuildLine():
            ThreePointArc((-31.1369051993, 1), (-30.4297984181, 0.7071067812), (-30.1369051993, 0))
            Line((-30.1369051993, 0), (-30.1169051993, 0))
            Line((-30.1169051993, 0), (-30.1169051993, 1.02))
            Line((-30.1169051993, 1.02), (-31.1369051993, 1.02))
            Line((-31.1369051993, 1.02), (-31.1369051993, 1))
        make_face()
        with BuildLine():
            ThreePointArc((-31.1369051993, 6), (-30.4297984181, 6.2928932188), (-30.1369051993, 7))
            Line((-30.1369051993, 7), (-30.1169051993, 7))
            Line((-30.1169051993, 7), (-30.1169051993, 5.98))
            Line((-30.1169051993, 5.98), (-31.1369051993, 5.98))
            Line((-31.1369051993, 5.98), (-31.1369051993, 6))
        make_face()
    extrude(amount=F22_T35_DEPTH, mode=Mode.SUBTRACT)

    # F22_s38 → F22_t37 (cut)
    with BuildSketch(Plane.YZ.offset(-29.1369051993)):
        with BuildLine():
            ThreePointArc((-0.2915403917, 0), (0.0013528271, 0.7071067812), (0.7084596083, 1))
            Line((0.7084596083, 1), (0.7084596083, 1.02))
            Line((0.7084596083, 1.02), (-0.3115403917, 1.02))
            Line((-0.3115403917, 1.02), (-0.3115403917, 0))
            Line((-0.3115403917, 0), (-0.2915403917, 0))
        make_face()
        with BuildLine():
            ThreePointArc((-0.2915403917, 7), (0.0013528271, 6.2928932188), (0.7084596083, 6))
            Line((0.7084596083, 6), (0.7084596083, 5.98))
            Line((0.7084596083, 5.98), (-0.3115403917, 5.98))
            Line((-0.3115403917, 5.98), (-0.3115403917, 7))
            Line((-0.3115403917, 7), (-0.2915403917, 7))
        make_face()
        with BuildLine():
            ThreePointArc((-12.2915403917, 1), (-12.9986471729, 0.7071067812), (-13.2915403917, 0))
            Line((-13.2915403917, 0), (-13.3115403917, 0))
            Line((-13.3115403917, 0), (-13.3115403917, 1.02))
            Line((-13.3115403917, 1.02), (-12.2915403917, 1.02))
            Line((-12.2915403917, 1.02), (-12.2915403917, 1))
        make_face()
        with BuildLine():
            ThreePointArc((-12.2915403917, 6), (-12.9986471729, 6.2928932188), (-13.2915403917, 7))
            Line((-13.2915403917, 7), (-13.3115403917, 7))
            Line((-13.3115403917, 7), (-13.3115403917, 5.98))
            Line((-13.3115403917, 5.98), (-12.2915403917, 5.98))
            Line((-12.2915403917, 5.98), (-12.2915403917, 6))
        make_face()
        with BuildLine():
            ThreePointArc((-12.2915403917, 1), (-11.5844336106, 0.7071067812), (-11.2915403917, 0))
            Line((-11.2915403917, 0), (-11.2715403917, 0))
            Line((-11.2715403917, 0), (-11.2715403917, 1.02))
            Line((-11.2715403917, 1.02), (-12.2915403917, 1.02))
            Line((-12.2915403917, 1.02), (-12.2915403917, 1))
        make_face()
        with BuildLine():
            ThreePointArc((-12.2915403917, 6), (-11.5844336106, 6.2928932188), (-11.2915403917, 7))
            Line((-11.2915403917, 7), (-11.2715403917, 7))
            Line((-11.2715403917, 7), (-11.2715403917, 5.98))
            Line((-11.2715403917, 5.98), (-12.2915403917, 5.98))
            Line((-12.2915403917, 5.98), (-12.2915403917, 6))
        make_face()
    extrude(amount=F22_T37_DEPTH, mode=Mode.SUBTRACT)

    # F22_s40 → F22_t39 (cut)
    with BuildSketch(Plane.XZ.offset(14.2915403917)):
        with BuildLine():
            ThreePointArc((-31.1369051993, 1), (-30.4297984181, 0.7071067812), (-30.1369051993, 0))
            Line((-30.1369051993, 0), (-30.1169051993, 0))
            Line((-30.1169051993, 0), (-30.1169051993, 1.02))
            Line((-30.1169051993, 1.02), (-31.1369051993, 1.02))
            Line((-31.1369051993, 1.02), (-31.1369051993, 1))
        make_face()
        with BuildLine():
            ThreePointArc((-31.1369051993, 6), (-30.4297984181, 6.2928932188), (-30.1369051993, 7))
            Line((-30.1369051993, 7), (-30.1169051993, 7))
            Line((-30.1169051993, 7), (-30.1169051993, 5.98))
            Line((-30.1169051993, 5.98), (-31.1369051993, 5.98))
            Line((-31.1369051993, 5.98), (-31.1369051993, 6))
        make_face()
    extrude(amount=F22_T39_DEPTH, mode=Mode.SUBTRACT)

    # F22_s41 → F22_t42 (revolve, cut)
    with BuildSketch(Plane.YZ.offset(-20.1369051993)):
        with BuildLine():
            ThreePointArc((-11.2915403917, 7), (-11.5844336106, 6.2928932188), (-12.2915403917, 6))
            Line((-12.2915403917, 6), (-12.2915403917, 5.98))
            Line((-12.2915403917, 5.98), (-11.2715403917, 5.98))
            Line((-11.2715403917, 5.98), (-11.2715403917, 7))
            Line((-11.2715403917, 7), (-11.2915403917, 7))
        make_face()
    revolve(axis=Axis((-20.1369051993, -11.2915403917, 5), (0, 1, 0)), revolution_arc=F22_T42_ANGLE, mode=Mode.SUBTRACT)

    # F22_s43 → F22_t44 (revolve, cut)
    with BuildSketch(Plane.XZ.offset(10.2915403917)):
        with BuildLine():
            ThreePointArc((-31.1369051993, 6), (-30.4297984181, 6.2928932188), (-30.1369051993, 7))
            Line((-30.1369051993, 7), (-30.1169051993, 7))
            Line((-30.1169051993, 7), (-30.1169051993, 5.98))
            Line((-30.1169051993, 5.98), (-31.1369051993, 5.98))
            Line((-31.1369051993, 5.98), (-31.1369051993, 6))
        make_face()
    revolve(axis=Axis((-29.1369051993, -10.2915403917, 6), (0, 0, 1)), revolution_arc=F22_T44_ANGLE, mode=Mode.SUBTRACT)

    # F22_s45 → F22_t46 (revolve, cut)
    with BuildSketch(Plane.YZ.offset(-20.1369051993)):
        with BuildLine():
            ThreePointArc((-11.2915403917, 0), (-11.5844336106, 0.7071067812), (-12.2915403917, 1))
            Line((-12.2915403917, 1), (-12.2915403917, 1.02))
            Line((-12.2915403917, 1.02), (-11.2715403917, 1.02))
            Line((-11.2715403917, 1.02), (-11.2715403917, 0))
            Line((-11.2715403917, 0), (-11.2915403917, 0))
        make_face()
    revolve(axis=Axis((-20.1369051993, -11.2915403917, 2), (0, -1, 0)), revolution_arc=F22_T46_ANGLE, mode=Mode.SUBTRACT)

    # F22_s47 → F22_t48 (revolve, cut)
    with BuildSketch(Plane.XZ.offset(10.2915403917)):
        with BuildLine():
            ThreePointArc((-31.1369051993, 1), (-30.4297984181, 0.7071067812), (-30.1369051993, 0))
            Line((-30.1369051993, 0), (-30.1169051993, 0))
            Line((-30.1169051993, 0), (-30.1169051993, 1.02))
            Line((-30.1169051993, 1.02), (-31.1369051993, 1.02))
            Line((-31.1369051993, 1.02), (-31.1369051993, 1))
        make_face()
    revolve(axis=Axis((-29.1369051993, -10.2915403917, 1), (0, 0, 1)), revolution_arc=F22_T48_ANGLE, mode=Mode.SUBTRACT)

    # F22_s49 → F22_t50 (revolve, cut)
    with BuildSketch(Plane.YZ.offset(-29.1369051993)):
        with BuildLine():
            ThreePointArc((-12.2915403917, 6), (-12.9986471729, 6.2928932188), (-13.2915403917, 7))
            Line((-13.2915403917, 7), (-13.3115403917, 7))
            Line((-13.3115403917, 7), (-13.3115403917, 5.98))
            Line((-13.3115403917, 5.98), (-12.2915403917, 5.98))
            Line((-12.2915403917, 5.98), (-12.2915403917, 6))
        make_face()
    revolve(axis=Axis((-29.1369051993, -14.2915403917, 6), (0, 0, 1)), revolution_arc=F22_T50_ANGLE, mode=Mode.SUBTRACT)

    # F22_s51 → F22_t52 (revolve, cut)
    with BuildSketch(Plane.YZ.offset(-20.1369051993)):
        with BuildLine():
            ThreePointArc((-13.2915403917, 7), (-12.9986471729, 6.2928932188), (-12.2915403917, 6))
            Line((-12.2915403917, 6), (-12.2915403917, 5.98))
            Line((-12.2915403917, 5.98), (-13.3115403917, 5.98))
            Line((-13.3115403917, 5.98), (-13.3115403917, 7))
            Line((-13.3115403917, 7), (-13.2915403917, 7))
        make_face()
    revolve(axis=Axis((-20.1369051993, -13.2915403917, 5), (0, 1, 0)), revolution_arc=F22_T52_ANGLE, mode=Mode.SUBTRACT)

    # F22_s53 → F22_t54 (revolve, cut)
    with BuildSketch(Plane.XZ.offset(31.2915403917)):
        with BuildLine():
            ThreePointArc((-30.1369051993, 7), (-30.4297984181, 6.2928932188), (-31.1369051993, 6))
            Line((-31.1369051993, 6), (-31.1369051993, 5.98))
            Line((-31.1369051993, 5.98), (-30.1169051993, 5.98))
            Line((-30.1169051993, 5.98), (-30.1169051993, 7))
            Line((-30.1169051993, 7), (-30.1369051993, 7))
        make_face()
    revolve(axis=Axis((-30.1369051993, -31.2915403917, 5), (1, 0, 0)), revolution_arc=F22_T54_ANGLE, mode=Mode.SUBTRACT)

    # F22_s55 → F22_t56 (revolve, cut)
    with BuildSketch(Plane.YZ.offset(-29.1369051993)):
        with BuildLine():
            ThreePointArc((-12.2915403917, 1), (-12.9986471729, 0.7071067812), (-13.2915403917, 0))
            Line((-13.2915403917, 0), (-13.3115403917, 0))
            Line((-13.3115403917, 0), (-13.3115403917, 1.02))
            Line((-13.3115403917, 1.02), (-12.2915403917, 1.02))
            Line((-12.2915403917, 1.02), (-12.2915403917, 1))
        make_face()
    revolve(axis=Axis((-29.1369051993, -14.2915403917, 1), (0, 0, 1)), revolution_arc=F22_T56_ANGLE, mode=Mode.SUBTRACT)

    # F22_s57 → F22_t58 (revolve, cut)
    with BuildSketch(Plane.YZ.offset(-20.1369051993)):
        with BuildLine():
            ThreePointArc((-13.2915403917, 0), (-12.9986471729, 0.7071067812), (-12.2915403917, 1))
            Line((-12.2915403917, 1), (-12.2915403917, 1.02))
            Line((-12.2915403917, 1.02), (-13.3115403917, 1.02))
            Line((-13.3115403917, 1.02), (-13.3115403917, 0))
            Line((-13.3115403917, 0), (-13.2915403917, 0))
        make_face()
    revolve(axis=Axis((-20.1369051993, -13.2915403917, 2), (0, -1, 0)), revolution_arc=F22_T58_ANGLE, mode=Mode.SUBTRACT)

    # F22_s59 → F22_t60 (revolve, cut)
    with BuildSketch(Plane.XZ.offset(31.2915403917)):
        with BuildLine():
            ThreePointArc((-30.1369051993, 0), (-30.4297984181, 0.7071067812), (-31.1369051993, 1))
            Line((-31.1369051993, 1), (-31.1369051993, 1.02))
            Line((-31.1369051993, 1.02), (-30.1169051993, 1.02))
            Line((-30.1169051993, 1.02), (-30.1169051993, 0))
            Line((-30.1169051993, 0), (-30.1369051993, 0))
        make_face()
    revolve(axis=Axis((-30.1369051993, -31.2915403917, 2), (-1, 0, 0)), revolution_arc=F22_T60_ANGLE, mode=Mode.SUBTRACT)

    # F22_s61 → F22_t62 (revolve, cut)
    with BuildSketch(Plane.YZ.offset(-29.1369051993)):
        with BuildLine():
            ThreePointArc((0.7084596083, 6), (0.0013528271, 6.2928932188), (-0.2915403917, 7))
            Line((-0.2915403917, 7), (-0.3115403917, 7))
            Line((-0.3115403917, 7), (-0.3115403917, 5.98))
            Line((-0.3115403917, 5.98), (0.7084596083, 5.98))
            Line((0.7084596083, 5.98), (0.7084596083, 6))
        make_face()
    revolve(axis=Axis((-29.1369051993, -1.2915403917, 6), (0, 0, 1)), revolution_arc=F22_T62_ANGLE, mode=Mode.SUBTRACT)

    # F22_s63 → F22_t64 (revolve, cut)
    with BuildSketch(Plane.YZ.offset(-20.1369051993)):
        with BuildLine():
            ThreePointArc((-0.2915403917, 7), (0.0013528271, 6.2928932188), (0.7084596083, 6))
            Line((0.7084596083, 6), (0.7084596083, 5.98))
            Line((0.7084596083, 5.98), (-0.3115403917, 5.98))
            Line((-0.3115403917, 5.98), (-0.3115403917, 7))
            Line((-0.3115403917, 7), (-0.2915403917, 7))
        make_face()
    revolve(axis=Axis((-20.1369051993, -0.2915403917, 5), (0, 1, 0)), revolution_arc=F22_T64_ANGLE, mode=Mode.SUBTRACT)

    # F22_s65 → F22_t66 (revolve, cut)
    with BuildSketch(Plane.YZ.offset(-29.1369051993)):
        with BuildLine():
            ThreePointArc((-0.2915403917, 0), (0.0013528271, 0.7071067812), (0.7084596083, 1))
            Line((0.7084596083, 1), (0.7084596083, 1.02))
            Line((0.7084596083, 1.02), (-0.3115403917, 1.02))
            Line((-0.3115403917, 1.02), (-0.3115403917, 0))
            Line((-0.3115403917, 0), (-0.2915403917, 0))
        make_face()
    revolve(axis=Axis((-29.1369051993, -1.2915403917, 1), (0, 0, 1)), revolution_arc=F22_T66_ANGLE, mode=Mode.SUBTRACT)

    # F22_s67 → F22_t68 (revolve, cut)
    with BuildSketch(Plane.YZ.offset(-20.1369051993)):
        with BuildLine():
            ThreePointArc((-0.2915403917, 0), (0.0013528271, 0.7071067812), (0.7084596083, 1))
            Line((0.7084596083, 1), (0.7084596083, 1.02))
            Line((0.7084596083, 1.02), (-0.3115403917, 1.02))
            Line((-0.3115403917, 1.02), (-0.3115403917, 0))
            Line((-0.3115403917, 0), (-0.2915403917, 0))
        make_face()
    revolve(axis=Axis((-20.1369051993, -0.2915403917, 2), (0, -1, 0)), revolution_arc=F22_T68_ANGLE, mode=Mode.SUBTRACT)


solid = f19_1.part
